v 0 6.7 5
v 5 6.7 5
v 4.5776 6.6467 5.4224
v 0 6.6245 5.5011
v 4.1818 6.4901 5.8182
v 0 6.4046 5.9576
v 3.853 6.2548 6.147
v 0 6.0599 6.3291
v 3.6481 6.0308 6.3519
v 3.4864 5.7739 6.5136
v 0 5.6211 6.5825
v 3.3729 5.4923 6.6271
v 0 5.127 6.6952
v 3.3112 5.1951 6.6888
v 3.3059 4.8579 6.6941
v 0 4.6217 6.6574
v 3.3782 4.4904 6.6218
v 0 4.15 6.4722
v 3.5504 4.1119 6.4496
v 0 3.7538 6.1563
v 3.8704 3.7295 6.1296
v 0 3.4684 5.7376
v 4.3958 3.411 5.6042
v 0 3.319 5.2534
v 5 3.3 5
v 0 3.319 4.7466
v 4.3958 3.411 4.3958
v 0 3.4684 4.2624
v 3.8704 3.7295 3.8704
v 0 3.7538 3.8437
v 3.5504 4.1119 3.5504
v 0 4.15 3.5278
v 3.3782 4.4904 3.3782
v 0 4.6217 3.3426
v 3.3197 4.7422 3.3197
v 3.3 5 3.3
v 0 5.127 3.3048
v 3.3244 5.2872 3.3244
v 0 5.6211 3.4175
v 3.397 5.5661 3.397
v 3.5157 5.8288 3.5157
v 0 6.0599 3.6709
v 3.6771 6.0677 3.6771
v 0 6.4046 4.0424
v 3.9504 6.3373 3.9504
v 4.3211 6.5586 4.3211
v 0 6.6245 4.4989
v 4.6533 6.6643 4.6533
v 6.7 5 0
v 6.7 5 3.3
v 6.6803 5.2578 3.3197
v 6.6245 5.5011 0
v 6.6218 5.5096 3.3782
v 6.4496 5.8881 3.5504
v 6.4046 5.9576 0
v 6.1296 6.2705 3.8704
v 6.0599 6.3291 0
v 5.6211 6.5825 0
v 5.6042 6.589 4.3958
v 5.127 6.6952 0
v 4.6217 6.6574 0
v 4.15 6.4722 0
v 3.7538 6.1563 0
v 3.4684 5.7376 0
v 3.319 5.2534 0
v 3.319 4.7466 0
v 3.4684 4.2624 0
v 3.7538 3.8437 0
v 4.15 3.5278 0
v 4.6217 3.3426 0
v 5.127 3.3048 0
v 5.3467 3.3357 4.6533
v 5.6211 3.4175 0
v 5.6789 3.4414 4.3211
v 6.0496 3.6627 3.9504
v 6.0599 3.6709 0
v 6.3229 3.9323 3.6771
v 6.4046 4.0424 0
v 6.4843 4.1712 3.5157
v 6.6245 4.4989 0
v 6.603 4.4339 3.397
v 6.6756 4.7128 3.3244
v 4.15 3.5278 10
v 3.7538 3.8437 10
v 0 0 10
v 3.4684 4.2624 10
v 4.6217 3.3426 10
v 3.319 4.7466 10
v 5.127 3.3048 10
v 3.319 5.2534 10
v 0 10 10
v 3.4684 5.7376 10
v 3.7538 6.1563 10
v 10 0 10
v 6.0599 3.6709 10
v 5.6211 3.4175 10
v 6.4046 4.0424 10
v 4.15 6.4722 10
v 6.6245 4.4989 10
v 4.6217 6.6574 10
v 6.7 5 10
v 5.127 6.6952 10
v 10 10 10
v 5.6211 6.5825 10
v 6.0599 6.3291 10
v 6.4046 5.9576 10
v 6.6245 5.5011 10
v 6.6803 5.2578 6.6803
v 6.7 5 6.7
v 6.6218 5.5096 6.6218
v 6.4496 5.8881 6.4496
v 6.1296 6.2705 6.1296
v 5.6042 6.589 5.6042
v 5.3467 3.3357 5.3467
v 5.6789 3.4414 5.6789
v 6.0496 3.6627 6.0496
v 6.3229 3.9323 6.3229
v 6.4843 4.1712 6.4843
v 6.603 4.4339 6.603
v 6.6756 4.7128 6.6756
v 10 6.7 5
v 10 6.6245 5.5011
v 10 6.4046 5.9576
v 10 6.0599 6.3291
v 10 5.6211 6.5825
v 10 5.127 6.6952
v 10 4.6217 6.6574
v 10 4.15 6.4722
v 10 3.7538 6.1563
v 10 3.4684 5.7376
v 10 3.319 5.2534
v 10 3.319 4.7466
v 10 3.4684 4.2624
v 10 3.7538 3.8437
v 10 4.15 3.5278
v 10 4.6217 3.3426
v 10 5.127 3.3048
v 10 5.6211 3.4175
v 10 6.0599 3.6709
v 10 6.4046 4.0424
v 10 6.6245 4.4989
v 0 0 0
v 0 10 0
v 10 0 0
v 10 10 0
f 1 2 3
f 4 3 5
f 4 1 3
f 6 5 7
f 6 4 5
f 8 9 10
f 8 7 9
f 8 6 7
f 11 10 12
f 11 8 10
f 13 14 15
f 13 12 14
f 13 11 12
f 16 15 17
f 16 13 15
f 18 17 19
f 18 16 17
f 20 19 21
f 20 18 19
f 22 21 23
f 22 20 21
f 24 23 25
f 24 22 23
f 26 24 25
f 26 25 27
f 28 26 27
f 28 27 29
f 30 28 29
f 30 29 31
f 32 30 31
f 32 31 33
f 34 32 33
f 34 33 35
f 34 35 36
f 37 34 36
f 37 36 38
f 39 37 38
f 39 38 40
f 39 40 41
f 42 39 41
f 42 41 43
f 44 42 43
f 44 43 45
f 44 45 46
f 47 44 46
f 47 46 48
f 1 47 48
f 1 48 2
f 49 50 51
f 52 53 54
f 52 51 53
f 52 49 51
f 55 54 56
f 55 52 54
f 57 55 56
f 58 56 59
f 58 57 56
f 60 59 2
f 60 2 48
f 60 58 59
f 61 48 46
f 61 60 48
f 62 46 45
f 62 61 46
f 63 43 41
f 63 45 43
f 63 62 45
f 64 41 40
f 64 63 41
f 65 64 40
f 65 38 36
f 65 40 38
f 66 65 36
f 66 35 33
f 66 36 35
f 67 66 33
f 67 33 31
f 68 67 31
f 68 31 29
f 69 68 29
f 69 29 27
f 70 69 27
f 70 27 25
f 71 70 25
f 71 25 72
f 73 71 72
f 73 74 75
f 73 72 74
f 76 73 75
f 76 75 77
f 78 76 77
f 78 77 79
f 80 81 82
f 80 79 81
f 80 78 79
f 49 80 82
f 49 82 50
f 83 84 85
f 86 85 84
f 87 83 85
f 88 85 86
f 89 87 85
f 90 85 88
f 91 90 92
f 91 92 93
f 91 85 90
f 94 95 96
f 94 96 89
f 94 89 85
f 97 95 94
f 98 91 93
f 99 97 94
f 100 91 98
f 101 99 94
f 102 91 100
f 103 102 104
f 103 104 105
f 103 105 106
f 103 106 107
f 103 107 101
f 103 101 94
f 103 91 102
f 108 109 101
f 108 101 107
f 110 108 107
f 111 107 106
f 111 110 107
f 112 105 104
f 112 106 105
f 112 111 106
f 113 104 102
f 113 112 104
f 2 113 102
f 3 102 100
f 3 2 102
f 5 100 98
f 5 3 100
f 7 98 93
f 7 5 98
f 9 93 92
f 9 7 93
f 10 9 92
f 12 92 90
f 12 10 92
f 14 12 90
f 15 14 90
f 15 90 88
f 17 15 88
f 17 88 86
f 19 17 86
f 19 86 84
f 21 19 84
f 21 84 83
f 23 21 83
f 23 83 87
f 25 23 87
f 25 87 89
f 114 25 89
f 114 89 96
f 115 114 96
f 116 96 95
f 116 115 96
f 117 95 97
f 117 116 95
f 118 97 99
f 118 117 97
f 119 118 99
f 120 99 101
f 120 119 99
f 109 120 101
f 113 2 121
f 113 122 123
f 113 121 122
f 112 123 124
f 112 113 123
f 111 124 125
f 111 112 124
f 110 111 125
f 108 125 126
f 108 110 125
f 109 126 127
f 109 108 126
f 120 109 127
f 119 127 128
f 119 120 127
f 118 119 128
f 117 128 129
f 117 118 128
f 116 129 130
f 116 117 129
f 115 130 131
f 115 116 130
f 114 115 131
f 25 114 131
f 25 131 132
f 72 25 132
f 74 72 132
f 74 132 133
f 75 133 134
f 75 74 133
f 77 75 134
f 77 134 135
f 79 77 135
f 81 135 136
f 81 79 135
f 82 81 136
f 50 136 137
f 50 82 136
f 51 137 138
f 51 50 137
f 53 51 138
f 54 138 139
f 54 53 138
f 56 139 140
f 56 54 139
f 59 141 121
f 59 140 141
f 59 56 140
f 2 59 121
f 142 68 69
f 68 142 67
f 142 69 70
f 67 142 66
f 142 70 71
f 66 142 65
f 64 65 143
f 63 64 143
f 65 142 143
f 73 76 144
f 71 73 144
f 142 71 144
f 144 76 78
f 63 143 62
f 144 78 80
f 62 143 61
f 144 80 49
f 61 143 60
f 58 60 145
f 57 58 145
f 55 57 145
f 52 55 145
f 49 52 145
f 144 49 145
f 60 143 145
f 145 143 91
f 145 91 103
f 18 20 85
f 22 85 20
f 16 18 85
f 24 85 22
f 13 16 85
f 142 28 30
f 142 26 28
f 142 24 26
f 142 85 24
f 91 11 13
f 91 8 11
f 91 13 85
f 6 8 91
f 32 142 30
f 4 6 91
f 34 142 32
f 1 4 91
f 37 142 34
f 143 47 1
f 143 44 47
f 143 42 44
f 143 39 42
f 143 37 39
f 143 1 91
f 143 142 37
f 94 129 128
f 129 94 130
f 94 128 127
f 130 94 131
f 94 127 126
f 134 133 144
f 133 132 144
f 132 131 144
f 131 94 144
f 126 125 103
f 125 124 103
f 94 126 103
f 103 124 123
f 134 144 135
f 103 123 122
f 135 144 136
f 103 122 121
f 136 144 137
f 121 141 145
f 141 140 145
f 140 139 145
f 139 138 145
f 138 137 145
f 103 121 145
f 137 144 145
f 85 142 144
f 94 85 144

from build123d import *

# Parameters (mm, degrees)
ESQUISSE1_W                  = 10
ESQUISSE1_H                  = 10
BOSS_EXTRU_1_DEPTH           = 10
ESQUISSE2_R                  = 1.5
ENL_V_MAT_EXTRU_1_DEPTH      = 18.320508076
ESQUISSE3_R                  = 1.5
ENL_V_MAT_EXTRU_2_DEPTH      = 18.320508076
D_GAGEMENT_START             = -1
D_GAGEMENT_M31_OUTLINE_R     = 1.7
D_GAGEMENT_M31_OUTLINE_R_2   = 1.5
D_GAGEMENT_M31_DEPTH         = 12
D_GAGEMENT_M31_2_OUTLINE_R   = 1.7
D_GAGEMENT_M31_2_OUTLINE_R_2 = 1.5
D_GAGEMENT_M31_2_DEPTH       = 12


with BuildPart() as part:
    # Esquisse1 → Boss.-Extru.1 (new body)
    with BuildSketch(Plane.XY):
        with Locations((5, 5)):
            Rectangle(ESQUISSE1_W, ESQUISSE1_H)
    extrude(amount=BOSS_EXTRU_1_DEPTH)

    # Esquisse2 → Enlèv. mat.-Extru.1 (cut, through all)
    with BuildSketch(Plane.XY.offset(10)):
        with Locations((5, 5)):
            Circle(ESQUISSE2_R)
    extrude(amount=-ENL_V_MAT_EXTRU_1_DEPTH, mode=Mode.SUBTRACT)

    # Esquisse3 → Enlèv. mat.-Extru.2 (cut, through all)
    with BuildSketch(Plane.ZY):
        with Locations((5, 5)):
            Circle(ESQUISSE3_R)
    extrude(amount=-ENL_V_MAT_EXTRU_2_DEPTH, mode=Mode.SUBTRACT)

    # Dégagement M31: read off the stored shape, not the designer's step
    # Dégagement M31 outline → Dégagement M31 (cut)
    with BuildSketch(Plane.XY.offset(D_GAGEMENT_START)):
        with Locations((5, 5)):
            Circle(D_GAGEMENT_M31_OUTLINE_R)
        with Locations((5, 5)):
            Circle(D_GAGEMENT_M31_OUTLINE_R_2, mode=Mode.SUBTRACT)
    extrude(amount=D_GAGEMENT_M31_DEPTH, mode=Mode.SUBTRACT)

    # D_gagement M31 2 outline → D_gagement M31 2 (cut)
    with BuildSketch(Plane.YZ.offset(D_GAGEMENT_START)):
        with Locations((5, 5)):
            Circle(D_GAGEMENT_M31_2_OUTLINE_R)
        with Locations((5, 5)):
            Circle(D_GAGEMENT_M31_2_OUTLINE_R_2, mode=Mode.SUBTRACT)
    extrude(amount=D_GAGEMENT_M31_2_DEPTH, mode=Mode.SUBTRACT)


solid = part.part
